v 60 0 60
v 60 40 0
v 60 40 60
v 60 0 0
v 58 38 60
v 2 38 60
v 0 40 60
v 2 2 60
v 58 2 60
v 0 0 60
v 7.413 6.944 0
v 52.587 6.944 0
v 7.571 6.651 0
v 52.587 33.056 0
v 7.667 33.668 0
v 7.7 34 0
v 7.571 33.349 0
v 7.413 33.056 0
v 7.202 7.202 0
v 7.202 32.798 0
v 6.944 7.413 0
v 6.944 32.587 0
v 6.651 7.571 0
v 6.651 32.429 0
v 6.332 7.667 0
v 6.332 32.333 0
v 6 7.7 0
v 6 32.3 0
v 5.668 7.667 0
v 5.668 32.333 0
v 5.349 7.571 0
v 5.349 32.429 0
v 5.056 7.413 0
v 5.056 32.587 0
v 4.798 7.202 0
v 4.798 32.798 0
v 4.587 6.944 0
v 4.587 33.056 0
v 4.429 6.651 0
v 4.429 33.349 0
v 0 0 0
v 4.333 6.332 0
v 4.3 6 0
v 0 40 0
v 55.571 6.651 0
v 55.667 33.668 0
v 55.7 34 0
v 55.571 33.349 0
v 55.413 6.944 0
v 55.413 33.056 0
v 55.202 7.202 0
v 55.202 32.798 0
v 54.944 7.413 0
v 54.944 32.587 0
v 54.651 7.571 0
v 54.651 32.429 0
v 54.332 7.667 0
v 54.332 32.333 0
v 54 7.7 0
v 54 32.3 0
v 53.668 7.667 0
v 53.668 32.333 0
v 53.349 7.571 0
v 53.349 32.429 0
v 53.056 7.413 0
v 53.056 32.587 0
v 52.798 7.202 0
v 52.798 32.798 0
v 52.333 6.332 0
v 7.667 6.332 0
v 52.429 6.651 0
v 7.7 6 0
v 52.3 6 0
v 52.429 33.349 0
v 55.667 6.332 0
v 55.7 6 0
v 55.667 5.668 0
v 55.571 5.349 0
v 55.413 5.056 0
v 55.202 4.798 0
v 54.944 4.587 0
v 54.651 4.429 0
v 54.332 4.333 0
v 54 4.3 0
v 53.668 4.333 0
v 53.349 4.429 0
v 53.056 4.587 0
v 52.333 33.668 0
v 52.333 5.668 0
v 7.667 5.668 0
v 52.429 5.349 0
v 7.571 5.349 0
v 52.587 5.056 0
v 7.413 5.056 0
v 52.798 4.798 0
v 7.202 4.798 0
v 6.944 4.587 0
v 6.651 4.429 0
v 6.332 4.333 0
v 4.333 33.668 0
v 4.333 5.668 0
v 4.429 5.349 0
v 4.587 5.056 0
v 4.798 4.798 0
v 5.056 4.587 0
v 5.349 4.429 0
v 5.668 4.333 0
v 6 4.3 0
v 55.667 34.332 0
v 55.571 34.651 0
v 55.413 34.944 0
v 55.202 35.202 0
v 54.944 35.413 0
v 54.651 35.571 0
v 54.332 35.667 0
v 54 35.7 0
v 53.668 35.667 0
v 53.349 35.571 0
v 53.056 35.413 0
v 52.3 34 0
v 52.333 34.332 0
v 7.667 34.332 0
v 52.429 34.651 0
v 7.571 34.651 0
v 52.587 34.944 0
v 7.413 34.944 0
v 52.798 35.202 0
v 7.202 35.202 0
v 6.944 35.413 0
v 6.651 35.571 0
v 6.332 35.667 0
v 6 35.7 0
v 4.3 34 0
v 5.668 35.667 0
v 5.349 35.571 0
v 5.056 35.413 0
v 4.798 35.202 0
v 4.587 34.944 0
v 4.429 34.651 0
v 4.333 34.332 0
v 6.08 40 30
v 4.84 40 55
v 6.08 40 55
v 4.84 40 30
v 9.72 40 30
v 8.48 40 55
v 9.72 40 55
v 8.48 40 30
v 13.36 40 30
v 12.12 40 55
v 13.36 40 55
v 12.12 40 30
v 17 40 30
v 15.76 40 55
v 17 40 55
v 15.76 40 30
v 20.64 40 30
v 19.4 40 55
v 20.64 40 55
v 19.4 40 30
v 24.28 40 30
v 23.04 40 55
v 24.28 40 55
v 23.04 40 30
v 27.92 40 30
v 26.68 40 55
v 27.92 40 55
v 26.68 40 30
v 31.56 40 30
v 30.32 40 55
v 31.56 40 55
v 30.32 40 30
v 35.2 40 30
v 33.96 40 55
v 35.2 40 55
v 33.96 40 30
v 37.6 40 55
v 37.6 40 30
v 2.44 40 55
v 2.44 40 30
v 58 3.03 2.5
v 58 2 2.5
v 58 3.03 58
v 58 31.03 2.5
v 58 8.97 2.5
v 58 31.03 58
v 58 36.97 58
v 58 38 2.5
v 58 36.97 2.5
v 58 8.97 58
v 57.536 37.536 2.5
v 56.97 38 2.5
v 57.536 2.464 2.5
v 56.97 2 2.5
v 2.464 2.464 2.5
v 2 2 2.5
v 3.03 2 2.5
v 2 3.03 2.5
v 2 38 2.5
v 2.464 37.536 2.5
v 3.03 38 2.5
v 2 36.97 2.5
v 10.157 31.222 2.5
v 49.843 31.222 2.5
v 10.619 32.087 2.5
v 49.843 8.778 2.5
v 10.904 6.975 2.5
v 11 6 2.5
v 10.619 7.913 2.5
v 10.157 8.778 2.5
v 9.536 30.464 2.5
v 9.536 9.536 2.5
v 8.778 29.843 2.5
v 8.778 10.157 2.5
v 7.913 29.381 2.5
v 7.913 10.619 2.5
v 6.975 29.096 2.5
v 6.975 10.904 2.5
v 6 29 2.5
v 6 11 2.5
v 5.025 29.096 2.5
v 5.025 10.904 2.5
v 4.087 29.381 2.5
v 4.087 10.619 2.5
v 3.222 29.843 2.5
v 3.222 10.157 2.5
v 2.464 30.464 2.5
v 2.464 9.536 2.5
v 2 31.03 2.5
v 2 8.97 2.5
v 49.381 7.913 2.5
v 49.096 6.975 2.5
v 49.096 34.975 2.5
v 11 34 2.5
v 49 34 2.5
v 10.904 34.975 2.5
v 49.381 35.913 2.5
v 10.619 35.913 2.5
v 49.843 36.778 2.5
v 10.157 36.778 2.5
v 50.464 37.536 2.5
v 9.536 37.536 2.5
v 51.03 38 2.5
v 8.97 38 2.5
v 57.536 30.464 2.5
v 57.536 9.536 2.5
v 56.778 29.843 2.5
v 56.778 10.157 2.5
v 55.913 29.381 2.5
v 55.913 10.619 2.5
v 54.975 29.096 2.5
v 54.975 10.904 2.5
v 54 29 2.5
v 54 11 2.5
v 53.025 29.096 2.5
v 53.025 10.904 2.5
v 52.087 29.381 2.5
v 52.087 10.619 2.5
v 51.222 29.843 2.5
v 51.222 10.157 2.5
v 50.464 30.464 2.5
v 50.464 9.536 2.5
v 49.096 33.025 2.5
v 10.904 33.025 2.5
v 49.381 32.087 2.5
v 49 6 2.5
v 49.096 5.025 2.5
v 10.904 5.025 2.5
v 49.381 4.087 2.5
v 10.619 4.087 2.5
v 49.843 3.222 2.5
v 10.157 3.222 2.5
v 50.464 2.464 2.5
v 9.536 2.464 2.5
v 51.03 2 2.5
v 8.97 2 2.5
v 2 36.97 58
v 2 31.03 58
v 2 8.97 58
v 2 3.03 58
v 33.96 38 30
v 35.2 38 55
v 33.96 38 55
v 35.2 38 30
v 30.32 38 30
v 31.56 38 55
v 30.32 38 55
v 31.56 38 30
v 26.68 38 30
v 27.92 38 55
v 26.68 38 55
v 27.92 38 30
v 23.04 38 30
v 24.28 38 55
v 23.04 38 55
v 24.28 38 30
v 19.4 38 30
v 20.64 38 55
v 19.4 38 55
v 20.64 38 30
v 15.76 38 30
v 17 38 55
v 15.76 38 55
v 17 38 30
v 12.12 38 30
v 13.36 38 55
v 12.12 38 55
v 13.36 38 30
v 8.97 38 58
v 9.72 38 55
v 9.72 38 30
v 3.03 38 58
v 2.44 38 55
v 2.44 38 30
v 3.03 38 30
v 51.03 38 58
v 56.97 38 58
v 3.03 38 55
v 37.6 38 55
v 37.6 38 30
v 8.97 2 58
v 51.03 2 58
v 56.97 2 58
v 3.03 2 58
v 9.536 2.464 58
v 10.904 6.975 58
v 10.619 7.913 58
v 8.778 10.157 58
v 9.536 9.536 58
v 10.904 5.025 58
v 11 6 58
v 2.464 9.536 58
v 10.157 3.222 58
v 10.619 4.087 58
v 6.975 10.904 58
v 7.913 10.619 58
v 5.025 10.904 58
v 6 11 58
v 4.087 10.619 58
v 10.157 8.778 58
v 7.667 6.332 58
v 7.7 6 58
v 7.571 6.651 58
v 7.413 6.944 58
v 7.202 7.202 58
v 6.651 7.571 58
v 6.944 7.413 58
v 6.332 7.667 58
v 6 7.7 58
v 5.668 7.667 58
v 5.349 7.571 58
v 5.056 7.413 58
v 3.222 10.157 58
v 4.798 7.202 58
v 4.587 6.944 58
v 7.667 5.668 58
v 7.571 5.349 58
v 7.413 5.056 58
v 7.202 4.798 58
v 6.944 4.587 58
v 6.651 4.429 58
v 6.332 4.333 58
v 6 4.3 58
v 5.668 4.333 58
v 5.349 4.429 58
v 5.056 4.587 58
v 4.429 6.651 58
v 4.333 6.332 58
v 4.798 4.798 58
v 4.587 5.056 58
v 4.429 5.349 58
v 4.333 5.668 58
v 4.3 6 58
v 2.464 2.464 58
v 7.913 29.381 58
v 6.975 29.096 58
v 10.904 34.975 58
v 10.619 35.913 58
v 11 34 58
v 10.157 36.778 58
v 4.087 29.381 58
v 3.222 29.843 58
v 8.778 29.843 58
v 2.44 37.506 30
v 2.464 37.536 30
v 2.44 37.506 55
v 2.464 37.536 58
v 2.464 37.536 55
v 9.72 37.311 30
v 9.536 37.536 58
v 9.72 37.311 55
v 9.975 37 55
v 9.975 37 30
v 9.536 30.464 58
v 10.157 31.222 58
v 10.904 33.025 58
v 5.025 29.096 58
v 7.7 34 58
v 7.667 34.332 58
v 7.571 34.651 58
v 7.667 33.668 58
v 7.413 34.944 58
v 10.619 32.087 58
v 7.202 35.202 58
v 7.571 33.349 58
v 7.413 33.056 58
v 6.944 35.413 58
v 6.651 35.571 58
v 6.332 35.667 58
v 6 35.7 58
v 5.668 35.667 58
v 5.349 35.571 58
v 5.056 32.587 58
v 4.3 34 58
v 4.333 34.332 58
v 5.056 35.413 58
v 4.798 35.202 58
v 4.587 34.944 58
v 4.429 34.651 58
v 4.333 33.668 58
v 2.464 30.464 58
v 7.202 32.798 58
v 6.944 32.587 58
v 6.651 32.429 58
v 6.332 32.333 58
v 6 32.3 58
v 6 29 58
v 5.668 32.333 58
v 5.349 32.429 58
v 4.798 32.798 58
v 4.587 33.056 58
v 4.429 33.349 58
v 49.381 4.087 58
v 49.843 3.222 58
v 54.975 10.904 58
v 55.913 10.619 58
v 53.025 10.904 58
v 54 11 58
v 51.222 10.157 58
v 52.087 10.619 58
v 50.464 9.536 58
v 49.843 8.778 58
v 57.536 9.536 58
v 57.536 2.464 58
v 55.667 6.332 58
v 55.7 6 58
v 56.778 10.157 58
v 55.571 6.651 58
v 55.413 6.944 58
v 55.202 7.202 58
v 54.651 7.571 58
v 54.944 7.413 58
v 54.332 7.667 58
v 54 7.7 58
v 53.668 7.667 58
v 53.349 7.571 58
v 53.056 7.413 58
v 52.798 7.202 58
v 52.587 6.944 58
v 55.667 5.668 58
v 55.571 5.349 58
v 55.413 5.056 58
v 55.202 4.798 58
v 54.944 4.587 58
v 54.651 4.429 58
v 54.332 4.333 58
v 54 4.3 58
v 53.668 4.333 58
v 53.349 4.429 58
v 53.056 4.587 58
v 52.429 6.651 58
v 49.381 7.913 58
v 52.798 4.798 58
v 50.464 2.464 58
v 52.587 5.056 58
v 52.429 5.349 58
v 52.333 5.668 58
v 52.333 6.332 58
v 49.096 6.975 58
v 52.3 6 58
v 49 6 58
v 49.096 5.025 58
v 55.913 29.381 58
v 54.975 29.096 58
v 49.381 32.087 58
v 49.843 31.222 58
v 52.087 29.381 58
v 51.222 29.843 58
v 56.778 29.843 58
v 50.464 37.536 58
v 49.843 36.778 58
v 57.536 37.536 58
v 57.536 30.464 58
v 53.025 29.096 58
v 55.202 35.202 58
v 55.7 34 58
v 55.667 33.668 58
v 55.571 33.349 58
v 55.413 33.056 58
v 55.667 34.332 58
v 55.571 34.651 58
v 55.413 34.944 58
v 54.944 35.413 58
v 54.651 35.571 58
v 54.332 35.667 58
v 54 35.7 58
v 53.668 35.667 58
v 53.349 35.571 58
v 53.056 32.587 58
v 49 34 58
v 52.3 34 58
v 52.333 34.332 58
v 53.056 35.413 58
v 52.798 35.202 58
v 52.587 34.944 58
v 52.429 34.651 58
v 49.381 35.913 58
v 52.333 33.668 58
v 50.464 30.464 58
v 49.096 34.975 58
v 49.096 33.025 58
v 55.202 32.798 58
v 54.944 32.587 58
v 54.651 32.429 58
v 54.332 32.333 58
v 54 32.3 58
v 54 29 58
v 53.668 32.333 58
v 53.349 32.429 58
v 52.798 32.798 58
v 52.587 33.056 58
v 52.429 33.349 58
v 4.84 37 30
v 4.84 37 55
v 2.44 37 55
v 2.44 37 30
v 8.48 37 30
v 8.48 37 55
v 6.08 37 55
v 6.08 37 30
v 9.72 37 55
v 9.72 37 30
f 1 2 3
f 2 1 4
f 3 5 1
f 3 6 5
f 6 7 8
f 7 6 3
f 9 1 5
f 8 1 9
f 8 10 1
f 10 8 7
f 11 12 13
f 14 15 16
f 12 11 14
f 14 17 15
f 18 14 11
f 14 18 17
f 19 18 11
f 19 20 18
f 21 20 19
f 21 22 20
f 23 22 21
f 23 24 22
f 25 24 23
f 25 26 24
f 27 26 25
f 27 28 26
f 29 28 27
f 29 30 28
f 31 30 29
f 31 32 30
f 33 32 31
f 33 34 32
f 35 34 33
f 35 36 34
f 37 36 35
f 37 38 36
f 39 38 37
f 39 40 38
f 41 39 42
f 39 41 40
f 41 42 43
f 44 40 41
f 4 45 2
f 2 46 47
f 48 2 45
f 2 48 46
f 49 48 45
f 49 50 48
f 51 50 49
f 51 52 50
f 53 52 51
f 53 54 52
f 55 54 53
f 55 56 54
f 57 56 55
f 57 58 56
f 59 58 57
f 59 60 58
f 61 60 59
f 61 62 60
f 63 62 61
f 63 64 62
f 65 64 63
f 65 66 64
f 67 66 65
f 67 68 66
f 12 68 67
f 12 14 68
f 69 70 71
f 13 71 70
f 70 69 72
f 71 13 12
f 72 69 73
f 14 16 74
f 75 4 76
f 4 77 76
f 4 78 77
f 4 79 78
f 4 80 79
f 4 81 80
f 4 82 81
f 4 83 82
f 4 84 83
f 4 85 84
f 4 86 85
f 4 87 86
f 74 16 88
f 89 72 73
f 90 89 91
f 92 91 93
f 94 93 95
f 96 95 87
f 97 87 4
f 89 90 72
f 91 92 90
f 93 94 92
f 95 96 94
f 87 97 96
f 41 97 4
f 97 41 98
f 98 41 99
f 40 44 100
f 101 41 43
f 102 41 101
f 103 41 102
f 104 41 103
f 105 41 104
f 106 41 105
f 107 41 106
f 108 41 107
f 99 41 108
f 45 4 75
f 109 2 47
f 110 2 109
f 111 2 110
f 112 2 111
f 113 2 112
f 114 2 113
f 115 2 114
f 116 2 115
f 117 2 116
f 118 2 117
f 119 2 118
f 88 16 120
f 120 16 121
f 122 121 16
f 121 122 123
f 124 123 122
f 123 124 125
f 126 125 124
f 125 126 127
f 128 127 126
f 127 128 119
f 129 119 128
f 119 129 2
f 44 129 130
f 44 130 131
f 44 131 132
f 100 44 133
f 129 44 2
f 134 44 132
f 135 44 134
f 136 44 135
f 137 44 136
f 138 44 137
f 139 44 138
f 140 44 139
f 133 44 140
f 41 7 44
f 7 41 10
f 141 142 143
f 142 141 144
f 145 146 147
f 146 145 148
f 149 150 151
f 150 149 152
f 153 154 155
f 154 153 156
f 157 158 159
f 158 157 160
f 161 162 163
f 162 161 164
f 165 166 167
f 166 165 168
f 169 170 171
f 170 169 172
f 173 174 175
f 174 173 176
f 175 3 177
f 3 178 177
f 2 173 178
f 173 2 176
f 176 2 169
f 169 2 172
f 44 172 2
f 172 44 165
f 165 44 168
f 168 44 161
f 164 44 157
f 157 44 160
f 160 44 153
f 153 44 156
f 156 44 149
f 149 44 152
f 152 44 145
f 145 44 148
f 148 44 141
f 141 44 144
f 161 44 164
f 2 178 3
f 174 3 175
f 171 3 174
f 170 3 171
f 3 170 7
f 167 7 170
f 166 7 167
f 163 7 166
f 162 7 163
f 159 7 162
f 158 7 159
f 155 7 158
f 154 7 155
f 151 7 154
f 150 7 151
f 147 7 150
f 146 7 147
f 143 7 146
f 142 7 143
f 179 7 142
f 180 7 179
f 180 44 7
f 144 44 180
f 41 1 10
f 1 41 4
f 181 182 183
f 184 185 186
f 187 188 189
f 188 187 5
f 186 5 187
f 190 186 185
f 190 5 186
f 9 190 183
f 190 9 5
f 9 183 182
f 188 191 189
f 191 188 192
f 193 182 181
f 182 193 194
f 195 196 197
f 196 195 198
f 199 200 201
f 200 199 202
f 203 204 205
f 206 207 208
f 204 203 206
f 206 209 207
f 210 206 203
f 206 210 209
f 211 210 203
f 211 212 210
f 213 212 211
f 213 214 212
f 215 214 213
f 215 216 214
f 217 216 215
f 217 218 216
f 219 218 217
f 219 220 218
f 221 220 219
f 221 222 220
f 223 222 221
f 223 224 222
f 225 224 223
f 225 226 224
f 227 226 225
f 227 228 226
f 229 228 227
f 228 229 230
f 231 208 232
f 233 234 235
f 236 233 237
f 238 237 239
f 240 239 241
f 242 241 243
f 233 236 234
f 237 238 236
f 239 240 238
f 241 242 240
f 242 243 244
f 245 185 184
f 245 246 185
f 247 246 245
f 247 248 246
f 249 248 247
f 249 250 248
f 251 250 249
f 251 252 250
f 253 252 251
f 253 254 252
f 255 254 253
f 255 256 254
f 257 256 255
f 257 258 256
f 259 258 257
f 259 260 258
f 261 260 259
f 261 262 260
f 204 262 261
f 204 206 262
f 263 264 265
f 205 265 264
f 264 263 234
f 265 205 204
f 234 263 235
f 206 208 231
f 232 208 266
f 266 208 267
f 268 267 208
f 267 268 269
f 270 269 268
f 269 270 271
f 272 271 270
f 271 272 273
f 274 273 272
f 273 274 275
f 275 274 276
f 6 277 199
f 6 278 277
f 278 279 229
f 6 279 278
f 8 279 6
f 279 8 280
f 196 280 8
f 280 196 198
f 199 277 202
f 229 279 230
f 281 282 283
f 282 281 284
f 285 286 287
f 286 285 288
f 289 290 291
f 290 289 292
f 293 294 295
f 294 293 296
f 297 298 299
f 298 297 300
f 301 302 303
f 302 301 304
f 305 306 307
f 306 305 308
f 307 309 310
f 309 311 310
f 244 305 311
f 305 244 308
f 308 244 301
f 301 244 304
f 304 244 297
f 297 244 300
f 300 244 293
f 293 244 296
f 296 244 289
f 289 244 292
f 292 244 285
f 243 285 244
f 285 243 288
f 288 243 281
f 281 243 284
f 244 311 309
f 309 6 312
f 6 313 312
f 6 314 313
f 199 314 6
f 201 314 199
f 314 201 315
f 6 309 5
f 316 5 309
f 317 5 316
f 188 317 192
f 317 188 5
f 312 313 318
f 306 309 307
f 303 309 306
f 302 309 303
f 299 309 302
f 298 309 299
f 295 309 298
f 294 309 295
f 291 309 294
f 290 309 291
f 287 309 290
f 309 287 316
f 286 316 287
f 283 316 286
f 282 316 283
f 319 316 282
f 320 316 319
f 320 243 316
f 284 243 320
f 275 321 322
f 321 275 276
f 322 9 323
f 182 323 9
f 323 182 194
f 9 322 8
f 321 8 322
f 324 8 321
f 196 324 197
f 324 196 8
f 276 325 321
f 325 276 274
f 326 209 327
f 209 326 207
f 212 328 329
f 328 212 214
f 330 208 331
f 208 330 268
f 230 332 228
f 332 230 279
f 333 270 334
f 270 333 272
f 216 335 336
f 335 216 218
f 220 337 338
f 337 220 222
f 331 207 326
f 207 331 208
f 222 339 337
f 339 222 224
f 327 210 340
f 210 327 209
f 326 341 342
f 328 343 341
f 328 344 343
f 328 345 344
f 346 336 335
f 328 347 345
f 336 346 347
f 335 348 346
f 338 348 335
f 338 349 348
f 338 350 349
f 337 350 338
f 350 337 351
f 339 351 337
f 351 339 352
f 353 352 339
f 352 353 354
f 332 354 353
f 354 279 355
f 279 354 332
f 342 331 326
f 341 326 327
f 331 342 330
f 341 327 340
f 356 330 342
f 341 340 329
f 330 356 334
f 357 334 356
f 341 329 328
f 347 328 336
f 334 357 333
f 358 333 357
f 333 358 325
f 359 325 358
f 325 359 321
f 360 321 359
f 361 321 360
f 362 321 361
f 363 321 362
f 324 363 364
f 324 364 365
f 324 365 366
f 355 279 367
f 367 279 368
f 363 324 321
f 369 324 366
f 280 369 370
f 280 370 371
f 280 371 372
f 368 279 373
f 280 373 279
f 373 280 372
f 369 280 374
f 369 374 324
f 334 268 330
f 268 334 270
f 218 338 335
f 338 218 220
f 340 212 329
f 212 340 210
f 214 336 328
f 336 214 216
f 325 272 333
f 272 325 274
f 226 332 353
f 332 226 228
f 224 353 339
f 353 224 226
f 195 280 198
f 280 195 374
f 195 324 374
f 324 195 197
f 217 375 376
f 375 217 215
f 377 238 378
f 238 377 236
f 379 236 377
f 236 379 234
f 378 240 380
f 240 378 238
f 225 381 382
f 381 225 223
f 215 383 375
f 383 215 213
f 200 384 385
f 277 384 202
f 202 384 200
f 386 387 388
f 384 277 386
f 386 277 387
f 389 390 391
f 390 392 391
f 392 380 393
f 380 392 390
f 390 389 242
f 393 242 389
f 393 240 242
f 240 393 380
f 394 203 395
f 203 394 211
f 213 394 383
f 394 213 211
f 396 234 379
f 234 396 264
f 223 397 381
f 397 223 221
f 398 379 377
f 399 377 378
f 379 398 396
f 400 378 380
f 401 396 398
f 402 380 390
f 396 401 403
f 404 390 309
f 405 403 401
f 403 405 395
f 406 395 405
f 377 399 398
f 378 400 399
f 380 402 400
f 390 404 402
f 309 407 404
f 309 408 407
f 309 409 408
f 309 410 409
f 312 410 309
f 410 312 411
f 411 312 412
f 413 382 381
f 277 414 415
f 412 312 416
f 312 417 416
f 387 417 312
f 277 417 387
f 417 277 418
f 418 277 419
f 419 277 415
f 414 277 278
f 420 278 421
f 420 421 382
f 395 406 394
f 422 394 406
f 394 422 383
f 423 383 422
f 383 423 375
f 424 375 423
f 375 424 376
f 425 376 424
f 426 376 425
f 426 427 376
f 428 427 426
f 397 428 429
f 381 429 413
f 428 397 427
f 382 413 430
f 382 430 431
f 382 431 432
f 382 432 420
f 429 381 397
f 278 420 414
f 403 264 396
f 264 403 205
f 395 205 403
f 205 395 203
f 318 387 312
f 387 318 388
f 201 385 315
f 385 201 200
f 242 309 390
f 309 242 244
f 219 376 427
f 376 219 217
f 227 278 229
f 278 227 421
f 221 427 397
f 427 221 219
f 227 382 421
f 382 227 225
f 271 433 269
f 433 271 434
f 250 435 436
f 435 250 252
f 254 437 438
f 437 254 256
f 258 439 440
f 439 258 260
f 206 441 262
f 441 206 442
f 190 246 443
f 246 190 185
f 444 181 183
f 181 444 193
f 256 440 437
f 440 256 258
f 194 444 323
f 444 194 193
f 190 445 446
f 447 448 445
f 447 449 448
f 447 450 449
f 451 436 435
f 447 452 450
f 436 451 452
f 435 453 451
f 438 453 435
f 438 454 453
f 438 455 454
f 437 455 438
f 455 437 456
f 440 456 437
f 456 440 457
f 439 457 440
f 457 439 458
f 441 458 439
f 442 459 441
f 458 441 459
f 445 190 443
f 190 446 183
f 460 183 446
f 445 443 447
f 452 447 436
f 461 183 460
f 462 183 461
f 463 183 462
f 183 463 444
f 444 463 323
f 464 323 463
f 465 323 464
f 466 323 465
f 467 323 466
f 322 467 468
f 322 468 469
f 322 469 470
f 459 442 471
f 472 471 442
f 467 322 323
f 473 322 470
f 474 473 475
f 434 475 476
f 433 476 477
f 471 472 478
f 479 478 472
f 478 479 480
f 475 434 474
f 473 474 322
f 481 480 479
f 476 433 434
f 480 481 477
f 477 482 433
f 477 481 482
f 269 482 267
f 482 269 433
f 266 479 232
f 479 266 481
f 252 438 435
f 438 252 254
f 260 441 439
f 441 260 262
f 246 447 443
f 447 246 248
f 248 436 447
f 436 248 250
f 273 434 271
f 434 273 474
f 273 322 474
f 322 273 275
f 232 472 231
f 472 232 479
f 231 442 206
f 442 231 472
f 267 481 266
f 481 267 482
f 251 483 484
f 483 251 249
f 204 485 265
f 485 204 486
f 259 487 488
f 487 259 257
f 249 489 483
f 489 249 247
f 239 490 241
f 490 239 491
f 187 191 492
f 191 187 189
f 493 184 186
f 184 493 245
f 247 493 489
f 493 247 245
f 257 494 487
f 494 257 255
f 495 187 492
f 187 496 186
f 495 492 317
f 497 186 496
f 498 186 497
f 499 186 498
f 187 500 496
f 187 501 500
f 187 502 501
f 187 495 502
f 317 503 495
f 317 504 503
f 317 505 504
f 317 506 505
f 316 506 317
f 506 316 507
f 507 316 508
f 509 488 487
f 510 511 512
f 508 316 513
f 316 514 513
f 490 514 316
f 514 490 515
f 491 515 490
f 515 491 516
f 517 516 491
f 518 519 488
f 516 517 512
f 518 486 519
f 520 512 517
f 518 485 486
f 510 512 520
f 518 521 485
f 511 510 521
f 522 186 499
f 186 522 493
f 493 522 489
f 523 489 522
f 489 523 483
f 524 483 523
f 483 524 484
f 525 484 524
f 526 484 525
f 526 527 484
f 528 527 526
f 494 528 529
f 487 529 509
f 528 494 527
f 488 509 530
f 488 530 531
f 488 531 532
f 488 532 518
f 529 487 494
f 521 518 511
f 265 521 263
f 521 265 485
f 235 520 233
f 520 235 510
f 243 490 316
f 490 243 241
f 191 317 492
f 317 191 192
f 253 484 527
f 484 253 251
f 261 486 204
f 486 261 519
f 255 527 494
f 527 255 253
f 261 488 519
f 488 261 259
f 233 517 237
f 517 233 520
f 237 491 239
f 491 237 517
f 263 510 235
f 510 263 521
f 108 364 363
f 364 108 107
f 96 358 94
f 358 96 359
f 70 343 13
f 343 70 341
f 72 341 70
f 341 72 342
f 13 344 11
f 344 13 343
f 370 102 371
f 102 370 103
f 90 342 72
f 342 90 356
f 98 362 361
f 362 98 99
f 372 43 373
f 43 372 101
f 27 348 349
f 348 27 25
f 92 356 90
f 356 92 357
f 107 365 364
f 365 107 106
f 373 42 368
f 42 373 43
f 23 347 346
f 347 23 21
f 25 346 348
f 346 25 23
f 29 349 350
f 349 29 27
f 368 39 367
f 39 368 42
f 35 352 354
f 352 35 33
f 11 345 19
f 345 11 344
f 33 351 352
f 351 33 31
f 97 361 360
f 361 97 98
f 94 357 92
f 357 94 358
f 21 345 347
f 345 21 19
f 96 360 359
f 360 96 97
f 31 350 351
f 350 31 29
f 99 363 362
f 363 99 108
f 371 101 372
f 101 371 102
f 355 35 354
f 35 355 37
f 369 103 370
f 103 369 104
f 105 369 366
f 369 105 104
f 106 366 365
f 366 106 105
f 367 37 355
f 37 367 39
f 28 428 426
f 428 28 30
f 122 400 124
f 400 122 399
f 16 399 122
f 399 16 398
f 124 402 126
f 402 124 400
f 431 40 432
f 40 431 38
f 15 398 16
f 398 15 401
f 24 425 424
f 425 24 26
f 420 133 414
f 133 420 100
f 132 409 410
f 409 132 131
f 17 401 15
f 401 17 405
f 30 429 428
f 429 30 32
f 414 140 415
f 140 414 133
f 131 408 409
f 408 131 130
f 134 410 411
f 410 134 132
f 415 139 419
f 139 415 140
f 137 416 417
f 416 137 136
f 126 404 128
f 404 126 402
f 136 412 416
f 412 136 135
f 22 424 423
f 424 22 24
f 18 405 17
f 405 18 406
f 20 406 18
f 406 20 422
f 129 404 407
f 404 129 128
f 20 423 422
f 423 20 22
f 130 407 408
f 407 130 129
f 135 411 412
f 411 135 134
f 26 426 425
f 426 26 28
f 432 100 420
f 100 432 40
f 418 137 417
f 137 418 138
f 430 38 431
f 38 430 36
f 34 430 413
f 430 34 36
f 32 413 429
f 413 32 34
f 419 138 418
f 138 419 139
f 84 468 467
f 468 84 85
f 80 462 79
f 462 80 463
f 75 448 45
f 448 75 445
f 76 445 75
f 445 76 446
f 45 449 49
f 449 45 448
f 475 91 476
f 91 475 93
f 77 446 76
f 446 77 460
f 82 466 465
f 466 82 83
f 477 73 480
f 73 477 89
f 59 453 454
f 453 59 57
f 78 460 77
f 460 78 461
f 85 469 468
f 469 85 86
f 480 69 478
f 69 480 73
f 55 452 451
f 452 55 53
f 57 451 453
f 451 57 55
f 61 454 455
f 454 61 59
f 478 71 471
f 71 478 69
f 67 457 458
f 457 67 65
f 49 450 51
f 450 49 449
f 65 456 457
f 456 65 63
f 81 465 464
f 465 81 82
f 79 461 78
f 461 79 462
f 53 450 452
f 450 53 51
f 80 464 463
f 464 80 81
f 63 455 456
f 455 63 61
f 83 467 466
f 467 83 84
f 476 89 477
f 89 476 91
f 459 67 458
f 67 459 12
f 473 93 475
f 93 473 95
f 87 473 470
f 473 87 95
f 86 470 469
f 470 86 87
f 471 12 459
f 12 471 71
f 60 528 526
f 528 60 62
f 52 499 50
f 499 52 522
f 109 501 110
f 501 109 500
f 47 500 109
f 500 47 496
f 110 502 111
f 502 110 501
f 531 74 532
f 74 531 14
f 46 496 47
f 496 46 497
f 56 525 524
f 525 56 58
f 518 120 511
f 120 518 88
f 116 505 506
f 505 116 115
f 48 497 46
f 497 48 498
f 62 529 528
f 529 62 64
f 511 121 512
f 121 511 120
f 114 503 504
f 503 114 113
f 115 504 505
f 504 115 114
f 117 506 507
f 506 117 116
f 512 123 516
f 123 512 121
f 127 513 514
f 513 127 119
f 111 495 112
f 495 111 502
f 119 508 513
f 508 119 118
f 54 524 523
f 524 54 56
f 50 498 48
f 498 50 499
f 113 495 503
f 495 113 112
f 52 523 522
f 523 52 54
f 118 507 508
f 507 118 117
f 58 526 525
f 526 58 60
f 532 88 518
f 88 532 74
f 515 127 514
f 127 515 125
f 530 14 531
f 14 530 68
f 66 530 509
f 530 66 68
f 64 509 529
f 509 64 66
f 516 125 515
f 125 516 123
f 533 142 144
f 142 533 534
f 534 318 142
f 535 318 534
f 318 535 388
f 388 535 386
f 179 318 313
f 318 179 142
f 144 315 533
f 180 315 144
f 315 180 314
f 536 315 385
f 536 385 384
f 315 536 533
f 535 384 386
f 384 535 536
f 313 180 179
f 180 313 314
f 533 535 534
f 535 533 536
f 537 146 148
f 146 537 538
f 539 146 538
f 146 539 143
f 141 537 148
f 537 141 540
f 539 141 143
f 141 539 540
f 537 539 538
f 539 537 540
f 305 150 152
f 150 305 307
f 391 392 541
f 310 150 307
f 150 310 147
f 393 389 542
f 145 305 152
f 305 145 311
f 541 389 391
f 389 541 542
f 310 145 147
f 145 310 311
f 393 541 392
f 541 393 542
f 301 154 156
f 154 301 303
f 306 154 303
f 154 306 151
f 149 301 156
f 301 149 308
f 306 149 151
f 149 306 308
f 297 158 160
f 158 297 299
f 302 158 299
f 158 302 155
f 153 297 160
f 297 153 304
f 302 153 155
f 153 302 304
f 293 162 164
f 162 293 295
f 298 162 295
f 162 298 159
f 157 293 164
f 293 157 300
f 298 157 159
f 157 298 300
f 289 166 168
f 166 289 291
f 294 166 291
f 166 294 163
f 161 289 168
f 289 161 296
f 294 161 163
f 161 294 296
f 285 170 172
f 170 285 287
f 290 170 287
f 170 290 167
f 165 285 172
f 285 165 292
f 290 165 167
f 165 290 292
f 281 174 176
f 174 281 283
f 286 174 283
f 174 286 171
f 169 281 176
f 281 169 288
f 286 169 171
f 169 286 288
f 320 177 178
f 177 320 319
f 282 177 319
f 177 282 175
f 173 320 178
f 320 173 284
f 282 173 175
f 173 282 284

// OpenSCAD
$fn = 32;

// ----------------------------------------------------------------------
// Enclosure body: 60 x 40 x 60 mm, wall 2 mm
// ----------------------------------------------------------------------

// --- parameters (mm) ---
length = 60;              // outside length, X
width = 40;               // outside width, Y
height = 60;              // outside height, Z
wall = 2;                 // side wall thickness
floor_t = 2.5;            // floor thickness
boss_d = 10;              // corner boss diameter
boss_h = 55.5;            // corner boss height above the floor
boss_hole_d = 3.4;        // lid screw clearance in the boss
boss_lip = 6;             // boss centre inset from the corner
vent_slots = 10;          // vent slots in the long wall
vent_w = 2.4;             // vent slot width
vent_h = 25;              // vent slot height
vent_pitch = 3.64;        // vent slot pitch
vent_z = 30;              // vent slot sill height

module shell() {
  difference() {
    cube([length, width, height]);
    /* hollow, open at the top */
    translate([wall, wall, floor_t])
      cube([length - 2 * wall, width - 2 * wall, height]);
  }
}

module bosses() {
  /* corner bosses, sunk 1 mm into the floor */
  for (sx = [0, 1]) for (sy = [0, 1])
    translate([sx * (length - 2 * boss_lip) + boss_lip, sy * (width - 2 * boss_lip) + boss_lip, floor_t - 1])
      cylinder(h = boss_h + 1, d = boss_d);
}

difference() {
  union() {
    shell();
    bosses();
  }
  /* boss screw holes */
  for (sx = [0, 1]) for (sy = [0, 1])
    translate([sx * (length - 2 * boss_lip) + boss_lip, sy * (width - 2 * boss_lip) + boss_lip, -1]) cylinder(h = floor_t + boss_h + 2, d = boss_hole_d);
  /* vent grille in the +Y wall */
  for (i = [0 : vent_slots - 1]) translate([vent_pitch * (i + 1) - vent_w / 2, width - wall - 1, vent_z]) cube([vent_w, wall + 2, vent_h]);
}
